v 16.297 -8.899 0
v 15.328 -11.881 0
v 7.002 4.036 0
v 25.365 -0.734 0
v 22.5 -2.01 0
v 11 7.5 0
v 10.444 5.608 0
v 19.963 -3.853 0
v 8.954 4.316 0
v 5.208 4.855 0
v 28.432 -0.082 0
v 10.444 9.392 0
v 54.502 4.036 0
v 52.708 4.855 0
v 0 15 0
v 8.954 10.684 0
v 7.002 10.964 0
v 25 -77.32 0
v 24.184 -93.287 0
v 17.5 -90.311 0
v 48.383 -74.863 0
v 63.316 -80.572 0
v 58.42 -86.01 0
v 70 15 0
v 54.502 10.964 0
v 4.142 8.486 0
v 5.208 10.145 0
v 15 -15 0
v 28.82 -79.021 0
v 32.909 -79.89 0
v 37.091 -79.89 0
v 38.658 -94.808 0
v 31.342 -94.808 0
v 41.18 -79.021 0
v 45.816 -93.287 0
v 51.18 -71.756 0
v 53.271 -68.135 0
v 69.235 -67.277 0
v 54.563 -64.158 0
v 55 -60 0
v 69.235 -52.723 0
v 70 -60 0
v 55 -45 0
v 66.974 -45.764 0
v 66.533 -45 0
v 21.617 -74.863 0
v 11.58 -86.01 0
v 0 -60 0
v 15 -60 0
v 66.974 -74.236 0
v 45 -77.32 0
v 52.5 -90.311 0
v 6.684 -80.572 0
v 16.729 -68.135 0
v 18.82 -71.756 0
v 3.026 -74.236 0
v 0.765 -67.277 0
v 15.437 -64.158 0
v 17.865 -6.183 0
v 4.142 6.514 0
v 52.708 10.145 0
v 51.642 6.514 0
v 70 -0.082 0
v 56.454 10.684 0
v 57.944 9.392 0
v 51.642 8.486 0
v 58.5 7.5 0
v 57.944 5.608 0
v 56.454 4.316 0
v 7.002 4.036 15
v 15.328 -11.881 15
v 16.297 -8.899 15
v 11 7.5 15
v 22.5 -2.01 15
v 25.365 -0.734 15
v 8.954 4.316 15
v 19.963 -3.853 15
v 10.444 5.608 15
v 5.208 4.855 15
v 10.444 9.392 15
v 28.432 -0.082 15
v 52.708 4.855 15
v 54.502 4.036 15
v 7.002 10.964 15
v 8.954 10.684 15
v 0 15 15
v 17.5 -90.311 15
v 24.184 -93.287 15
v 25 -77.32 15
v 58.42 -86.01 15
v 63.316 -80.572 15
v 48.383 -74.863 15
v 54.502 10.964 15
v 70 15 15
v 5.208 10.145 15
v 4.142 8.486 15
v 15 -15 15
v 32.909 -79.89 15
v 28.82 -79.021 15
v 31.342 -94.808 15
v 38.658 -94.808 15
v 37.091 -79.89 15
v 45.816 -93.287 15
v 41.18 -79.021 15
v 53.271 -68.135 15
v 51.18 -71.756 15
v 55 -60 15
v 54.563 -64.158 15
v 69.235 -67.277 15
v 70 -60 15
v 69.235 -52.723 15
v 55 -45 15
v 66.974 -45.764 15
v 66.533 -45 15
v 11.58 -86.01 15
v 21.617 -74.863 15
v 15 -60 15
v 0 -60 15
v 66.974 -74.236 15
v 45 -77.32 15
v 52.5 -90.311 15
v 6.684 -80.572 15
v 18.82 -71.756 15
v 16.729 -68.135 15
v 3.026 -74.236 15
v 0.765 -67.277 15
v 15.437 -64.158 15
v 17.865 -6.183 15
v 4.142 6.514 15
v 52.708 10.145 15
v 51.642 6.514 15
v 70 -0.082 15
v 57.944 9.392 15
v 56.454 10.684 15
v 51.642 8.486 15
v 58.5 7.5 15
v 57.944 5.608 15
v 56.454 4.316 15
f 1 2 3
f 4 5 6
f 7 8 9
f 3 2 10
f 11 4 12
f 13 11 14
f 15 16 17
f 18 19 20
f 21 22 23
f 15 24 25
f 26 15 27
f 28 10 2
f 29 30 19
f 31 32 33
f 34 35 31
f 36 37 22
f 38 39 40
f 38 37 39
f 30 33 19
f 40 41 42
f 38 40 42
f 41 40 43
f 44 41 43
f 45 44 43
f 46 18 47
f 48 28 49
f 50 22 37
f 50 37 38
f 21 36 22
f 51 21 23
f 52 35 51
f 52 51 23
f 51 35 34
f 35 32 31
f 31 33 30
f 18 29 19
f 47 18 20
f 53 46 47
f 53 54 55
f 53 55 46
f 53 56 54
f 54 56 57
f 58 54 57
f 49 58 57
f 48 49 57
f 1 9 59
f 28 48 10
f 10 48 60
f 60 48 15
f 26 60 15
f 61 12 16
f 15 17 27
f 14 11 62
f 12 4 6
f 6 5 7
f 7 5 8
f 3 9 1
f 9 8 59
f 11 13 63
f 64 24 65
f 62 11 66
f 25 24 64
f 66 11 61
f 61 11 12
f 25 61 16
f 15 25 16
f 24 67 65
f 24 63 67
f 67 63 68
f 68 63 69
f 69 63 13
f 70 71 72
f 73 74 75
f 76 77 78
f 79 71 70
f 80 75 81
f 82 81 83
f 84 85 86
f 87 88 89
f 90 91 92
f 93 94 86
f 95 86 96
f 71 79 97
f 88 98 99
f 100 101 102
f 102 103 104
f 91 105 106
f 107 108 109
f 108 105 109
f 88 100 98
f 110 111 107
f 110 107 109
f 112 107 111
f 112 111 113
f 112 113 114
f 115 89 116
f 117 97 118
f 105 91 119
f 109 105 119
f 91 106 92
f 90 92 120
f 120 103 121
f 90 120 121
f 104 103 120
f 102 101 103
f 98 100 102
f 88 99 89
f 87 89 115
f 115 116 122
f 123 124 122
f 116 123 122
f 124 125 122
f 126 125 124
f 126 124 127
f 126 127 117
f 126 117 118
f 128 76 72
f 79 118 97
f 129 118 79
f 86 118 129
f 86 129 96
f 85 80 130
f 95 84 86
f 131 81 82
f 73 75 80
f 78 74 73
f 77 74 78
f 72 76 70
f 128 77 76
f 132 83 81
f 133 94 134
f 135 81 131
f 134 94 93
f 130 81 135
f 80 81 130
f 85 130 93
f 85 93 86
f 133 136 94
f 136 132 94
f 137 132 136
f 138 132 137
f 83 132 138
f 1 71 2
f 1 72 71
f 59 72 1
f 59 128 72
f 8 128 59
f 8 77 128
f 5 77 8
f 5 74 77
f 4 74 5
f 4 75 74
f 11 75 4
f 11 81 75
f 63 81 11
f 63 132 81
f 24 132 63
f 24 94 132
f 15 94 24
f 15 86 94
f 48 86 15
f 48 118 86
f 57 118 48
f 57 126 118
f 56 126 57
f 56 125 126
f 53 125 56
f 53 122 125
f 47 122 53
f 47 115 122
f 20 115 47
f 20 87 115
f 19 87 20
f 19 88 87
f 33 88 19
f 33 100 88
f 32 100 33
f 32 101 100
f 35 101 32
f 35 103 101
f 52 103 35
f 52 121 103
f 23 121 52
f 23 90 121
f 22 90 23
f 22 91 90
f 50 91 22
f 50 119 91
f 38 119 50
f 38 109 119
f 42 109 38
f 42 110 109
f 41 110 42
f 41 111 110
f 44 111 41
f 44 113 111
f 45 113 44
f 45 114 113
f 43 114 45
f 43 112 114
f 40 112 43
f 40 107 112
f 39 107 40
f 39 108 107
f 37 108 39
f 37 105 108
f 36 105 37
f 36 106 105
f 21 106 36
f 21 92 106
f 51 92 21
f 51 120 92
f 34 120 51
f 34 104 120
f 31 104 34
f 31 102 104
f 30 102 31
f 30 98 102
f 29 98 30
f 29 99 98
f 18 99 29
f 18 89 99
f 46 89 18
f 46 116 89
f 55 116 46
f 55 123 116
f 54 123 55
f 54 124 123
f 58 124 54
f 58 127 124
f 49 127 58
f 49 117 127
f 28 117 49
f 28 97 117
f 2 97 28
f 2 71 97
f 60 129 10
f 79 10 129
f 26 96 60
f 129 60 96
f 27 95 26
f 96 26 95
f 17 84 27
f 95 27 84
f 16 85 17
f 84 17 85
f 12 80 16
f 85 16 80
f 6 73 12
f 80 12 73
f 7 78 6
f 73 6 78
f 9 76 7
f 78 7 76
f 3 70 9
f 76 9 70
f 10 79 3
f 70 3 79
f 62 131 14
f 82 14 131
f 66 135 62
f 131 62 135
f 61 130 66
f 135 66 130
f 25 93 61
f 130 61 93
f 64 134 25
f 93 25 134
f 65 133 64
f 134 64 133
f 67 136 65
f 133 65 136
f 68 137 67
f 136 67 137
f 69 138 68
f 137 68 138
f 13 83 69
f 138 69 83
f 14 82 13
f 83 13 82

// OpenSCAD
width=70;
height = 120;
thickness = 15;
depth = 15;
drillwhole = 7;

linear_extrude(depth){
    difference(){//upper bar
        translate([0,-thickness])
        square([width, 2*thickness]); 
        hull(){
        translate([2*thickness,-thickness])
        #circle(d=2*thickness); 
        translate([2*width,-thickness])
        #circle(d=2*thickness); 
        }
        //mounting
        translate([thickness/2,thickness/2,0])
        circle(d=drillwhole); // whole left
        translate([width-thickness,thickness/2,0])
        circle(d=drillwhole); // whole right
        
    }
    translate([0,-height/2,0])
    square([thickness, height/2]); // left bar
    translate([width/2,-height/2,0])
    difference(){ //lower part
        circle(d=width); // outer circle
        circle(d=width-2*thickness); //cutout circle
        translate([-(width-2*thickness)/2, 0,0])
        square([width-2*thickness, width/2]); // cut circle top
        translate([-(width-2*thickness)/2, thickness,0])
        square([width, width/2]); // cut circle right
    }
}
